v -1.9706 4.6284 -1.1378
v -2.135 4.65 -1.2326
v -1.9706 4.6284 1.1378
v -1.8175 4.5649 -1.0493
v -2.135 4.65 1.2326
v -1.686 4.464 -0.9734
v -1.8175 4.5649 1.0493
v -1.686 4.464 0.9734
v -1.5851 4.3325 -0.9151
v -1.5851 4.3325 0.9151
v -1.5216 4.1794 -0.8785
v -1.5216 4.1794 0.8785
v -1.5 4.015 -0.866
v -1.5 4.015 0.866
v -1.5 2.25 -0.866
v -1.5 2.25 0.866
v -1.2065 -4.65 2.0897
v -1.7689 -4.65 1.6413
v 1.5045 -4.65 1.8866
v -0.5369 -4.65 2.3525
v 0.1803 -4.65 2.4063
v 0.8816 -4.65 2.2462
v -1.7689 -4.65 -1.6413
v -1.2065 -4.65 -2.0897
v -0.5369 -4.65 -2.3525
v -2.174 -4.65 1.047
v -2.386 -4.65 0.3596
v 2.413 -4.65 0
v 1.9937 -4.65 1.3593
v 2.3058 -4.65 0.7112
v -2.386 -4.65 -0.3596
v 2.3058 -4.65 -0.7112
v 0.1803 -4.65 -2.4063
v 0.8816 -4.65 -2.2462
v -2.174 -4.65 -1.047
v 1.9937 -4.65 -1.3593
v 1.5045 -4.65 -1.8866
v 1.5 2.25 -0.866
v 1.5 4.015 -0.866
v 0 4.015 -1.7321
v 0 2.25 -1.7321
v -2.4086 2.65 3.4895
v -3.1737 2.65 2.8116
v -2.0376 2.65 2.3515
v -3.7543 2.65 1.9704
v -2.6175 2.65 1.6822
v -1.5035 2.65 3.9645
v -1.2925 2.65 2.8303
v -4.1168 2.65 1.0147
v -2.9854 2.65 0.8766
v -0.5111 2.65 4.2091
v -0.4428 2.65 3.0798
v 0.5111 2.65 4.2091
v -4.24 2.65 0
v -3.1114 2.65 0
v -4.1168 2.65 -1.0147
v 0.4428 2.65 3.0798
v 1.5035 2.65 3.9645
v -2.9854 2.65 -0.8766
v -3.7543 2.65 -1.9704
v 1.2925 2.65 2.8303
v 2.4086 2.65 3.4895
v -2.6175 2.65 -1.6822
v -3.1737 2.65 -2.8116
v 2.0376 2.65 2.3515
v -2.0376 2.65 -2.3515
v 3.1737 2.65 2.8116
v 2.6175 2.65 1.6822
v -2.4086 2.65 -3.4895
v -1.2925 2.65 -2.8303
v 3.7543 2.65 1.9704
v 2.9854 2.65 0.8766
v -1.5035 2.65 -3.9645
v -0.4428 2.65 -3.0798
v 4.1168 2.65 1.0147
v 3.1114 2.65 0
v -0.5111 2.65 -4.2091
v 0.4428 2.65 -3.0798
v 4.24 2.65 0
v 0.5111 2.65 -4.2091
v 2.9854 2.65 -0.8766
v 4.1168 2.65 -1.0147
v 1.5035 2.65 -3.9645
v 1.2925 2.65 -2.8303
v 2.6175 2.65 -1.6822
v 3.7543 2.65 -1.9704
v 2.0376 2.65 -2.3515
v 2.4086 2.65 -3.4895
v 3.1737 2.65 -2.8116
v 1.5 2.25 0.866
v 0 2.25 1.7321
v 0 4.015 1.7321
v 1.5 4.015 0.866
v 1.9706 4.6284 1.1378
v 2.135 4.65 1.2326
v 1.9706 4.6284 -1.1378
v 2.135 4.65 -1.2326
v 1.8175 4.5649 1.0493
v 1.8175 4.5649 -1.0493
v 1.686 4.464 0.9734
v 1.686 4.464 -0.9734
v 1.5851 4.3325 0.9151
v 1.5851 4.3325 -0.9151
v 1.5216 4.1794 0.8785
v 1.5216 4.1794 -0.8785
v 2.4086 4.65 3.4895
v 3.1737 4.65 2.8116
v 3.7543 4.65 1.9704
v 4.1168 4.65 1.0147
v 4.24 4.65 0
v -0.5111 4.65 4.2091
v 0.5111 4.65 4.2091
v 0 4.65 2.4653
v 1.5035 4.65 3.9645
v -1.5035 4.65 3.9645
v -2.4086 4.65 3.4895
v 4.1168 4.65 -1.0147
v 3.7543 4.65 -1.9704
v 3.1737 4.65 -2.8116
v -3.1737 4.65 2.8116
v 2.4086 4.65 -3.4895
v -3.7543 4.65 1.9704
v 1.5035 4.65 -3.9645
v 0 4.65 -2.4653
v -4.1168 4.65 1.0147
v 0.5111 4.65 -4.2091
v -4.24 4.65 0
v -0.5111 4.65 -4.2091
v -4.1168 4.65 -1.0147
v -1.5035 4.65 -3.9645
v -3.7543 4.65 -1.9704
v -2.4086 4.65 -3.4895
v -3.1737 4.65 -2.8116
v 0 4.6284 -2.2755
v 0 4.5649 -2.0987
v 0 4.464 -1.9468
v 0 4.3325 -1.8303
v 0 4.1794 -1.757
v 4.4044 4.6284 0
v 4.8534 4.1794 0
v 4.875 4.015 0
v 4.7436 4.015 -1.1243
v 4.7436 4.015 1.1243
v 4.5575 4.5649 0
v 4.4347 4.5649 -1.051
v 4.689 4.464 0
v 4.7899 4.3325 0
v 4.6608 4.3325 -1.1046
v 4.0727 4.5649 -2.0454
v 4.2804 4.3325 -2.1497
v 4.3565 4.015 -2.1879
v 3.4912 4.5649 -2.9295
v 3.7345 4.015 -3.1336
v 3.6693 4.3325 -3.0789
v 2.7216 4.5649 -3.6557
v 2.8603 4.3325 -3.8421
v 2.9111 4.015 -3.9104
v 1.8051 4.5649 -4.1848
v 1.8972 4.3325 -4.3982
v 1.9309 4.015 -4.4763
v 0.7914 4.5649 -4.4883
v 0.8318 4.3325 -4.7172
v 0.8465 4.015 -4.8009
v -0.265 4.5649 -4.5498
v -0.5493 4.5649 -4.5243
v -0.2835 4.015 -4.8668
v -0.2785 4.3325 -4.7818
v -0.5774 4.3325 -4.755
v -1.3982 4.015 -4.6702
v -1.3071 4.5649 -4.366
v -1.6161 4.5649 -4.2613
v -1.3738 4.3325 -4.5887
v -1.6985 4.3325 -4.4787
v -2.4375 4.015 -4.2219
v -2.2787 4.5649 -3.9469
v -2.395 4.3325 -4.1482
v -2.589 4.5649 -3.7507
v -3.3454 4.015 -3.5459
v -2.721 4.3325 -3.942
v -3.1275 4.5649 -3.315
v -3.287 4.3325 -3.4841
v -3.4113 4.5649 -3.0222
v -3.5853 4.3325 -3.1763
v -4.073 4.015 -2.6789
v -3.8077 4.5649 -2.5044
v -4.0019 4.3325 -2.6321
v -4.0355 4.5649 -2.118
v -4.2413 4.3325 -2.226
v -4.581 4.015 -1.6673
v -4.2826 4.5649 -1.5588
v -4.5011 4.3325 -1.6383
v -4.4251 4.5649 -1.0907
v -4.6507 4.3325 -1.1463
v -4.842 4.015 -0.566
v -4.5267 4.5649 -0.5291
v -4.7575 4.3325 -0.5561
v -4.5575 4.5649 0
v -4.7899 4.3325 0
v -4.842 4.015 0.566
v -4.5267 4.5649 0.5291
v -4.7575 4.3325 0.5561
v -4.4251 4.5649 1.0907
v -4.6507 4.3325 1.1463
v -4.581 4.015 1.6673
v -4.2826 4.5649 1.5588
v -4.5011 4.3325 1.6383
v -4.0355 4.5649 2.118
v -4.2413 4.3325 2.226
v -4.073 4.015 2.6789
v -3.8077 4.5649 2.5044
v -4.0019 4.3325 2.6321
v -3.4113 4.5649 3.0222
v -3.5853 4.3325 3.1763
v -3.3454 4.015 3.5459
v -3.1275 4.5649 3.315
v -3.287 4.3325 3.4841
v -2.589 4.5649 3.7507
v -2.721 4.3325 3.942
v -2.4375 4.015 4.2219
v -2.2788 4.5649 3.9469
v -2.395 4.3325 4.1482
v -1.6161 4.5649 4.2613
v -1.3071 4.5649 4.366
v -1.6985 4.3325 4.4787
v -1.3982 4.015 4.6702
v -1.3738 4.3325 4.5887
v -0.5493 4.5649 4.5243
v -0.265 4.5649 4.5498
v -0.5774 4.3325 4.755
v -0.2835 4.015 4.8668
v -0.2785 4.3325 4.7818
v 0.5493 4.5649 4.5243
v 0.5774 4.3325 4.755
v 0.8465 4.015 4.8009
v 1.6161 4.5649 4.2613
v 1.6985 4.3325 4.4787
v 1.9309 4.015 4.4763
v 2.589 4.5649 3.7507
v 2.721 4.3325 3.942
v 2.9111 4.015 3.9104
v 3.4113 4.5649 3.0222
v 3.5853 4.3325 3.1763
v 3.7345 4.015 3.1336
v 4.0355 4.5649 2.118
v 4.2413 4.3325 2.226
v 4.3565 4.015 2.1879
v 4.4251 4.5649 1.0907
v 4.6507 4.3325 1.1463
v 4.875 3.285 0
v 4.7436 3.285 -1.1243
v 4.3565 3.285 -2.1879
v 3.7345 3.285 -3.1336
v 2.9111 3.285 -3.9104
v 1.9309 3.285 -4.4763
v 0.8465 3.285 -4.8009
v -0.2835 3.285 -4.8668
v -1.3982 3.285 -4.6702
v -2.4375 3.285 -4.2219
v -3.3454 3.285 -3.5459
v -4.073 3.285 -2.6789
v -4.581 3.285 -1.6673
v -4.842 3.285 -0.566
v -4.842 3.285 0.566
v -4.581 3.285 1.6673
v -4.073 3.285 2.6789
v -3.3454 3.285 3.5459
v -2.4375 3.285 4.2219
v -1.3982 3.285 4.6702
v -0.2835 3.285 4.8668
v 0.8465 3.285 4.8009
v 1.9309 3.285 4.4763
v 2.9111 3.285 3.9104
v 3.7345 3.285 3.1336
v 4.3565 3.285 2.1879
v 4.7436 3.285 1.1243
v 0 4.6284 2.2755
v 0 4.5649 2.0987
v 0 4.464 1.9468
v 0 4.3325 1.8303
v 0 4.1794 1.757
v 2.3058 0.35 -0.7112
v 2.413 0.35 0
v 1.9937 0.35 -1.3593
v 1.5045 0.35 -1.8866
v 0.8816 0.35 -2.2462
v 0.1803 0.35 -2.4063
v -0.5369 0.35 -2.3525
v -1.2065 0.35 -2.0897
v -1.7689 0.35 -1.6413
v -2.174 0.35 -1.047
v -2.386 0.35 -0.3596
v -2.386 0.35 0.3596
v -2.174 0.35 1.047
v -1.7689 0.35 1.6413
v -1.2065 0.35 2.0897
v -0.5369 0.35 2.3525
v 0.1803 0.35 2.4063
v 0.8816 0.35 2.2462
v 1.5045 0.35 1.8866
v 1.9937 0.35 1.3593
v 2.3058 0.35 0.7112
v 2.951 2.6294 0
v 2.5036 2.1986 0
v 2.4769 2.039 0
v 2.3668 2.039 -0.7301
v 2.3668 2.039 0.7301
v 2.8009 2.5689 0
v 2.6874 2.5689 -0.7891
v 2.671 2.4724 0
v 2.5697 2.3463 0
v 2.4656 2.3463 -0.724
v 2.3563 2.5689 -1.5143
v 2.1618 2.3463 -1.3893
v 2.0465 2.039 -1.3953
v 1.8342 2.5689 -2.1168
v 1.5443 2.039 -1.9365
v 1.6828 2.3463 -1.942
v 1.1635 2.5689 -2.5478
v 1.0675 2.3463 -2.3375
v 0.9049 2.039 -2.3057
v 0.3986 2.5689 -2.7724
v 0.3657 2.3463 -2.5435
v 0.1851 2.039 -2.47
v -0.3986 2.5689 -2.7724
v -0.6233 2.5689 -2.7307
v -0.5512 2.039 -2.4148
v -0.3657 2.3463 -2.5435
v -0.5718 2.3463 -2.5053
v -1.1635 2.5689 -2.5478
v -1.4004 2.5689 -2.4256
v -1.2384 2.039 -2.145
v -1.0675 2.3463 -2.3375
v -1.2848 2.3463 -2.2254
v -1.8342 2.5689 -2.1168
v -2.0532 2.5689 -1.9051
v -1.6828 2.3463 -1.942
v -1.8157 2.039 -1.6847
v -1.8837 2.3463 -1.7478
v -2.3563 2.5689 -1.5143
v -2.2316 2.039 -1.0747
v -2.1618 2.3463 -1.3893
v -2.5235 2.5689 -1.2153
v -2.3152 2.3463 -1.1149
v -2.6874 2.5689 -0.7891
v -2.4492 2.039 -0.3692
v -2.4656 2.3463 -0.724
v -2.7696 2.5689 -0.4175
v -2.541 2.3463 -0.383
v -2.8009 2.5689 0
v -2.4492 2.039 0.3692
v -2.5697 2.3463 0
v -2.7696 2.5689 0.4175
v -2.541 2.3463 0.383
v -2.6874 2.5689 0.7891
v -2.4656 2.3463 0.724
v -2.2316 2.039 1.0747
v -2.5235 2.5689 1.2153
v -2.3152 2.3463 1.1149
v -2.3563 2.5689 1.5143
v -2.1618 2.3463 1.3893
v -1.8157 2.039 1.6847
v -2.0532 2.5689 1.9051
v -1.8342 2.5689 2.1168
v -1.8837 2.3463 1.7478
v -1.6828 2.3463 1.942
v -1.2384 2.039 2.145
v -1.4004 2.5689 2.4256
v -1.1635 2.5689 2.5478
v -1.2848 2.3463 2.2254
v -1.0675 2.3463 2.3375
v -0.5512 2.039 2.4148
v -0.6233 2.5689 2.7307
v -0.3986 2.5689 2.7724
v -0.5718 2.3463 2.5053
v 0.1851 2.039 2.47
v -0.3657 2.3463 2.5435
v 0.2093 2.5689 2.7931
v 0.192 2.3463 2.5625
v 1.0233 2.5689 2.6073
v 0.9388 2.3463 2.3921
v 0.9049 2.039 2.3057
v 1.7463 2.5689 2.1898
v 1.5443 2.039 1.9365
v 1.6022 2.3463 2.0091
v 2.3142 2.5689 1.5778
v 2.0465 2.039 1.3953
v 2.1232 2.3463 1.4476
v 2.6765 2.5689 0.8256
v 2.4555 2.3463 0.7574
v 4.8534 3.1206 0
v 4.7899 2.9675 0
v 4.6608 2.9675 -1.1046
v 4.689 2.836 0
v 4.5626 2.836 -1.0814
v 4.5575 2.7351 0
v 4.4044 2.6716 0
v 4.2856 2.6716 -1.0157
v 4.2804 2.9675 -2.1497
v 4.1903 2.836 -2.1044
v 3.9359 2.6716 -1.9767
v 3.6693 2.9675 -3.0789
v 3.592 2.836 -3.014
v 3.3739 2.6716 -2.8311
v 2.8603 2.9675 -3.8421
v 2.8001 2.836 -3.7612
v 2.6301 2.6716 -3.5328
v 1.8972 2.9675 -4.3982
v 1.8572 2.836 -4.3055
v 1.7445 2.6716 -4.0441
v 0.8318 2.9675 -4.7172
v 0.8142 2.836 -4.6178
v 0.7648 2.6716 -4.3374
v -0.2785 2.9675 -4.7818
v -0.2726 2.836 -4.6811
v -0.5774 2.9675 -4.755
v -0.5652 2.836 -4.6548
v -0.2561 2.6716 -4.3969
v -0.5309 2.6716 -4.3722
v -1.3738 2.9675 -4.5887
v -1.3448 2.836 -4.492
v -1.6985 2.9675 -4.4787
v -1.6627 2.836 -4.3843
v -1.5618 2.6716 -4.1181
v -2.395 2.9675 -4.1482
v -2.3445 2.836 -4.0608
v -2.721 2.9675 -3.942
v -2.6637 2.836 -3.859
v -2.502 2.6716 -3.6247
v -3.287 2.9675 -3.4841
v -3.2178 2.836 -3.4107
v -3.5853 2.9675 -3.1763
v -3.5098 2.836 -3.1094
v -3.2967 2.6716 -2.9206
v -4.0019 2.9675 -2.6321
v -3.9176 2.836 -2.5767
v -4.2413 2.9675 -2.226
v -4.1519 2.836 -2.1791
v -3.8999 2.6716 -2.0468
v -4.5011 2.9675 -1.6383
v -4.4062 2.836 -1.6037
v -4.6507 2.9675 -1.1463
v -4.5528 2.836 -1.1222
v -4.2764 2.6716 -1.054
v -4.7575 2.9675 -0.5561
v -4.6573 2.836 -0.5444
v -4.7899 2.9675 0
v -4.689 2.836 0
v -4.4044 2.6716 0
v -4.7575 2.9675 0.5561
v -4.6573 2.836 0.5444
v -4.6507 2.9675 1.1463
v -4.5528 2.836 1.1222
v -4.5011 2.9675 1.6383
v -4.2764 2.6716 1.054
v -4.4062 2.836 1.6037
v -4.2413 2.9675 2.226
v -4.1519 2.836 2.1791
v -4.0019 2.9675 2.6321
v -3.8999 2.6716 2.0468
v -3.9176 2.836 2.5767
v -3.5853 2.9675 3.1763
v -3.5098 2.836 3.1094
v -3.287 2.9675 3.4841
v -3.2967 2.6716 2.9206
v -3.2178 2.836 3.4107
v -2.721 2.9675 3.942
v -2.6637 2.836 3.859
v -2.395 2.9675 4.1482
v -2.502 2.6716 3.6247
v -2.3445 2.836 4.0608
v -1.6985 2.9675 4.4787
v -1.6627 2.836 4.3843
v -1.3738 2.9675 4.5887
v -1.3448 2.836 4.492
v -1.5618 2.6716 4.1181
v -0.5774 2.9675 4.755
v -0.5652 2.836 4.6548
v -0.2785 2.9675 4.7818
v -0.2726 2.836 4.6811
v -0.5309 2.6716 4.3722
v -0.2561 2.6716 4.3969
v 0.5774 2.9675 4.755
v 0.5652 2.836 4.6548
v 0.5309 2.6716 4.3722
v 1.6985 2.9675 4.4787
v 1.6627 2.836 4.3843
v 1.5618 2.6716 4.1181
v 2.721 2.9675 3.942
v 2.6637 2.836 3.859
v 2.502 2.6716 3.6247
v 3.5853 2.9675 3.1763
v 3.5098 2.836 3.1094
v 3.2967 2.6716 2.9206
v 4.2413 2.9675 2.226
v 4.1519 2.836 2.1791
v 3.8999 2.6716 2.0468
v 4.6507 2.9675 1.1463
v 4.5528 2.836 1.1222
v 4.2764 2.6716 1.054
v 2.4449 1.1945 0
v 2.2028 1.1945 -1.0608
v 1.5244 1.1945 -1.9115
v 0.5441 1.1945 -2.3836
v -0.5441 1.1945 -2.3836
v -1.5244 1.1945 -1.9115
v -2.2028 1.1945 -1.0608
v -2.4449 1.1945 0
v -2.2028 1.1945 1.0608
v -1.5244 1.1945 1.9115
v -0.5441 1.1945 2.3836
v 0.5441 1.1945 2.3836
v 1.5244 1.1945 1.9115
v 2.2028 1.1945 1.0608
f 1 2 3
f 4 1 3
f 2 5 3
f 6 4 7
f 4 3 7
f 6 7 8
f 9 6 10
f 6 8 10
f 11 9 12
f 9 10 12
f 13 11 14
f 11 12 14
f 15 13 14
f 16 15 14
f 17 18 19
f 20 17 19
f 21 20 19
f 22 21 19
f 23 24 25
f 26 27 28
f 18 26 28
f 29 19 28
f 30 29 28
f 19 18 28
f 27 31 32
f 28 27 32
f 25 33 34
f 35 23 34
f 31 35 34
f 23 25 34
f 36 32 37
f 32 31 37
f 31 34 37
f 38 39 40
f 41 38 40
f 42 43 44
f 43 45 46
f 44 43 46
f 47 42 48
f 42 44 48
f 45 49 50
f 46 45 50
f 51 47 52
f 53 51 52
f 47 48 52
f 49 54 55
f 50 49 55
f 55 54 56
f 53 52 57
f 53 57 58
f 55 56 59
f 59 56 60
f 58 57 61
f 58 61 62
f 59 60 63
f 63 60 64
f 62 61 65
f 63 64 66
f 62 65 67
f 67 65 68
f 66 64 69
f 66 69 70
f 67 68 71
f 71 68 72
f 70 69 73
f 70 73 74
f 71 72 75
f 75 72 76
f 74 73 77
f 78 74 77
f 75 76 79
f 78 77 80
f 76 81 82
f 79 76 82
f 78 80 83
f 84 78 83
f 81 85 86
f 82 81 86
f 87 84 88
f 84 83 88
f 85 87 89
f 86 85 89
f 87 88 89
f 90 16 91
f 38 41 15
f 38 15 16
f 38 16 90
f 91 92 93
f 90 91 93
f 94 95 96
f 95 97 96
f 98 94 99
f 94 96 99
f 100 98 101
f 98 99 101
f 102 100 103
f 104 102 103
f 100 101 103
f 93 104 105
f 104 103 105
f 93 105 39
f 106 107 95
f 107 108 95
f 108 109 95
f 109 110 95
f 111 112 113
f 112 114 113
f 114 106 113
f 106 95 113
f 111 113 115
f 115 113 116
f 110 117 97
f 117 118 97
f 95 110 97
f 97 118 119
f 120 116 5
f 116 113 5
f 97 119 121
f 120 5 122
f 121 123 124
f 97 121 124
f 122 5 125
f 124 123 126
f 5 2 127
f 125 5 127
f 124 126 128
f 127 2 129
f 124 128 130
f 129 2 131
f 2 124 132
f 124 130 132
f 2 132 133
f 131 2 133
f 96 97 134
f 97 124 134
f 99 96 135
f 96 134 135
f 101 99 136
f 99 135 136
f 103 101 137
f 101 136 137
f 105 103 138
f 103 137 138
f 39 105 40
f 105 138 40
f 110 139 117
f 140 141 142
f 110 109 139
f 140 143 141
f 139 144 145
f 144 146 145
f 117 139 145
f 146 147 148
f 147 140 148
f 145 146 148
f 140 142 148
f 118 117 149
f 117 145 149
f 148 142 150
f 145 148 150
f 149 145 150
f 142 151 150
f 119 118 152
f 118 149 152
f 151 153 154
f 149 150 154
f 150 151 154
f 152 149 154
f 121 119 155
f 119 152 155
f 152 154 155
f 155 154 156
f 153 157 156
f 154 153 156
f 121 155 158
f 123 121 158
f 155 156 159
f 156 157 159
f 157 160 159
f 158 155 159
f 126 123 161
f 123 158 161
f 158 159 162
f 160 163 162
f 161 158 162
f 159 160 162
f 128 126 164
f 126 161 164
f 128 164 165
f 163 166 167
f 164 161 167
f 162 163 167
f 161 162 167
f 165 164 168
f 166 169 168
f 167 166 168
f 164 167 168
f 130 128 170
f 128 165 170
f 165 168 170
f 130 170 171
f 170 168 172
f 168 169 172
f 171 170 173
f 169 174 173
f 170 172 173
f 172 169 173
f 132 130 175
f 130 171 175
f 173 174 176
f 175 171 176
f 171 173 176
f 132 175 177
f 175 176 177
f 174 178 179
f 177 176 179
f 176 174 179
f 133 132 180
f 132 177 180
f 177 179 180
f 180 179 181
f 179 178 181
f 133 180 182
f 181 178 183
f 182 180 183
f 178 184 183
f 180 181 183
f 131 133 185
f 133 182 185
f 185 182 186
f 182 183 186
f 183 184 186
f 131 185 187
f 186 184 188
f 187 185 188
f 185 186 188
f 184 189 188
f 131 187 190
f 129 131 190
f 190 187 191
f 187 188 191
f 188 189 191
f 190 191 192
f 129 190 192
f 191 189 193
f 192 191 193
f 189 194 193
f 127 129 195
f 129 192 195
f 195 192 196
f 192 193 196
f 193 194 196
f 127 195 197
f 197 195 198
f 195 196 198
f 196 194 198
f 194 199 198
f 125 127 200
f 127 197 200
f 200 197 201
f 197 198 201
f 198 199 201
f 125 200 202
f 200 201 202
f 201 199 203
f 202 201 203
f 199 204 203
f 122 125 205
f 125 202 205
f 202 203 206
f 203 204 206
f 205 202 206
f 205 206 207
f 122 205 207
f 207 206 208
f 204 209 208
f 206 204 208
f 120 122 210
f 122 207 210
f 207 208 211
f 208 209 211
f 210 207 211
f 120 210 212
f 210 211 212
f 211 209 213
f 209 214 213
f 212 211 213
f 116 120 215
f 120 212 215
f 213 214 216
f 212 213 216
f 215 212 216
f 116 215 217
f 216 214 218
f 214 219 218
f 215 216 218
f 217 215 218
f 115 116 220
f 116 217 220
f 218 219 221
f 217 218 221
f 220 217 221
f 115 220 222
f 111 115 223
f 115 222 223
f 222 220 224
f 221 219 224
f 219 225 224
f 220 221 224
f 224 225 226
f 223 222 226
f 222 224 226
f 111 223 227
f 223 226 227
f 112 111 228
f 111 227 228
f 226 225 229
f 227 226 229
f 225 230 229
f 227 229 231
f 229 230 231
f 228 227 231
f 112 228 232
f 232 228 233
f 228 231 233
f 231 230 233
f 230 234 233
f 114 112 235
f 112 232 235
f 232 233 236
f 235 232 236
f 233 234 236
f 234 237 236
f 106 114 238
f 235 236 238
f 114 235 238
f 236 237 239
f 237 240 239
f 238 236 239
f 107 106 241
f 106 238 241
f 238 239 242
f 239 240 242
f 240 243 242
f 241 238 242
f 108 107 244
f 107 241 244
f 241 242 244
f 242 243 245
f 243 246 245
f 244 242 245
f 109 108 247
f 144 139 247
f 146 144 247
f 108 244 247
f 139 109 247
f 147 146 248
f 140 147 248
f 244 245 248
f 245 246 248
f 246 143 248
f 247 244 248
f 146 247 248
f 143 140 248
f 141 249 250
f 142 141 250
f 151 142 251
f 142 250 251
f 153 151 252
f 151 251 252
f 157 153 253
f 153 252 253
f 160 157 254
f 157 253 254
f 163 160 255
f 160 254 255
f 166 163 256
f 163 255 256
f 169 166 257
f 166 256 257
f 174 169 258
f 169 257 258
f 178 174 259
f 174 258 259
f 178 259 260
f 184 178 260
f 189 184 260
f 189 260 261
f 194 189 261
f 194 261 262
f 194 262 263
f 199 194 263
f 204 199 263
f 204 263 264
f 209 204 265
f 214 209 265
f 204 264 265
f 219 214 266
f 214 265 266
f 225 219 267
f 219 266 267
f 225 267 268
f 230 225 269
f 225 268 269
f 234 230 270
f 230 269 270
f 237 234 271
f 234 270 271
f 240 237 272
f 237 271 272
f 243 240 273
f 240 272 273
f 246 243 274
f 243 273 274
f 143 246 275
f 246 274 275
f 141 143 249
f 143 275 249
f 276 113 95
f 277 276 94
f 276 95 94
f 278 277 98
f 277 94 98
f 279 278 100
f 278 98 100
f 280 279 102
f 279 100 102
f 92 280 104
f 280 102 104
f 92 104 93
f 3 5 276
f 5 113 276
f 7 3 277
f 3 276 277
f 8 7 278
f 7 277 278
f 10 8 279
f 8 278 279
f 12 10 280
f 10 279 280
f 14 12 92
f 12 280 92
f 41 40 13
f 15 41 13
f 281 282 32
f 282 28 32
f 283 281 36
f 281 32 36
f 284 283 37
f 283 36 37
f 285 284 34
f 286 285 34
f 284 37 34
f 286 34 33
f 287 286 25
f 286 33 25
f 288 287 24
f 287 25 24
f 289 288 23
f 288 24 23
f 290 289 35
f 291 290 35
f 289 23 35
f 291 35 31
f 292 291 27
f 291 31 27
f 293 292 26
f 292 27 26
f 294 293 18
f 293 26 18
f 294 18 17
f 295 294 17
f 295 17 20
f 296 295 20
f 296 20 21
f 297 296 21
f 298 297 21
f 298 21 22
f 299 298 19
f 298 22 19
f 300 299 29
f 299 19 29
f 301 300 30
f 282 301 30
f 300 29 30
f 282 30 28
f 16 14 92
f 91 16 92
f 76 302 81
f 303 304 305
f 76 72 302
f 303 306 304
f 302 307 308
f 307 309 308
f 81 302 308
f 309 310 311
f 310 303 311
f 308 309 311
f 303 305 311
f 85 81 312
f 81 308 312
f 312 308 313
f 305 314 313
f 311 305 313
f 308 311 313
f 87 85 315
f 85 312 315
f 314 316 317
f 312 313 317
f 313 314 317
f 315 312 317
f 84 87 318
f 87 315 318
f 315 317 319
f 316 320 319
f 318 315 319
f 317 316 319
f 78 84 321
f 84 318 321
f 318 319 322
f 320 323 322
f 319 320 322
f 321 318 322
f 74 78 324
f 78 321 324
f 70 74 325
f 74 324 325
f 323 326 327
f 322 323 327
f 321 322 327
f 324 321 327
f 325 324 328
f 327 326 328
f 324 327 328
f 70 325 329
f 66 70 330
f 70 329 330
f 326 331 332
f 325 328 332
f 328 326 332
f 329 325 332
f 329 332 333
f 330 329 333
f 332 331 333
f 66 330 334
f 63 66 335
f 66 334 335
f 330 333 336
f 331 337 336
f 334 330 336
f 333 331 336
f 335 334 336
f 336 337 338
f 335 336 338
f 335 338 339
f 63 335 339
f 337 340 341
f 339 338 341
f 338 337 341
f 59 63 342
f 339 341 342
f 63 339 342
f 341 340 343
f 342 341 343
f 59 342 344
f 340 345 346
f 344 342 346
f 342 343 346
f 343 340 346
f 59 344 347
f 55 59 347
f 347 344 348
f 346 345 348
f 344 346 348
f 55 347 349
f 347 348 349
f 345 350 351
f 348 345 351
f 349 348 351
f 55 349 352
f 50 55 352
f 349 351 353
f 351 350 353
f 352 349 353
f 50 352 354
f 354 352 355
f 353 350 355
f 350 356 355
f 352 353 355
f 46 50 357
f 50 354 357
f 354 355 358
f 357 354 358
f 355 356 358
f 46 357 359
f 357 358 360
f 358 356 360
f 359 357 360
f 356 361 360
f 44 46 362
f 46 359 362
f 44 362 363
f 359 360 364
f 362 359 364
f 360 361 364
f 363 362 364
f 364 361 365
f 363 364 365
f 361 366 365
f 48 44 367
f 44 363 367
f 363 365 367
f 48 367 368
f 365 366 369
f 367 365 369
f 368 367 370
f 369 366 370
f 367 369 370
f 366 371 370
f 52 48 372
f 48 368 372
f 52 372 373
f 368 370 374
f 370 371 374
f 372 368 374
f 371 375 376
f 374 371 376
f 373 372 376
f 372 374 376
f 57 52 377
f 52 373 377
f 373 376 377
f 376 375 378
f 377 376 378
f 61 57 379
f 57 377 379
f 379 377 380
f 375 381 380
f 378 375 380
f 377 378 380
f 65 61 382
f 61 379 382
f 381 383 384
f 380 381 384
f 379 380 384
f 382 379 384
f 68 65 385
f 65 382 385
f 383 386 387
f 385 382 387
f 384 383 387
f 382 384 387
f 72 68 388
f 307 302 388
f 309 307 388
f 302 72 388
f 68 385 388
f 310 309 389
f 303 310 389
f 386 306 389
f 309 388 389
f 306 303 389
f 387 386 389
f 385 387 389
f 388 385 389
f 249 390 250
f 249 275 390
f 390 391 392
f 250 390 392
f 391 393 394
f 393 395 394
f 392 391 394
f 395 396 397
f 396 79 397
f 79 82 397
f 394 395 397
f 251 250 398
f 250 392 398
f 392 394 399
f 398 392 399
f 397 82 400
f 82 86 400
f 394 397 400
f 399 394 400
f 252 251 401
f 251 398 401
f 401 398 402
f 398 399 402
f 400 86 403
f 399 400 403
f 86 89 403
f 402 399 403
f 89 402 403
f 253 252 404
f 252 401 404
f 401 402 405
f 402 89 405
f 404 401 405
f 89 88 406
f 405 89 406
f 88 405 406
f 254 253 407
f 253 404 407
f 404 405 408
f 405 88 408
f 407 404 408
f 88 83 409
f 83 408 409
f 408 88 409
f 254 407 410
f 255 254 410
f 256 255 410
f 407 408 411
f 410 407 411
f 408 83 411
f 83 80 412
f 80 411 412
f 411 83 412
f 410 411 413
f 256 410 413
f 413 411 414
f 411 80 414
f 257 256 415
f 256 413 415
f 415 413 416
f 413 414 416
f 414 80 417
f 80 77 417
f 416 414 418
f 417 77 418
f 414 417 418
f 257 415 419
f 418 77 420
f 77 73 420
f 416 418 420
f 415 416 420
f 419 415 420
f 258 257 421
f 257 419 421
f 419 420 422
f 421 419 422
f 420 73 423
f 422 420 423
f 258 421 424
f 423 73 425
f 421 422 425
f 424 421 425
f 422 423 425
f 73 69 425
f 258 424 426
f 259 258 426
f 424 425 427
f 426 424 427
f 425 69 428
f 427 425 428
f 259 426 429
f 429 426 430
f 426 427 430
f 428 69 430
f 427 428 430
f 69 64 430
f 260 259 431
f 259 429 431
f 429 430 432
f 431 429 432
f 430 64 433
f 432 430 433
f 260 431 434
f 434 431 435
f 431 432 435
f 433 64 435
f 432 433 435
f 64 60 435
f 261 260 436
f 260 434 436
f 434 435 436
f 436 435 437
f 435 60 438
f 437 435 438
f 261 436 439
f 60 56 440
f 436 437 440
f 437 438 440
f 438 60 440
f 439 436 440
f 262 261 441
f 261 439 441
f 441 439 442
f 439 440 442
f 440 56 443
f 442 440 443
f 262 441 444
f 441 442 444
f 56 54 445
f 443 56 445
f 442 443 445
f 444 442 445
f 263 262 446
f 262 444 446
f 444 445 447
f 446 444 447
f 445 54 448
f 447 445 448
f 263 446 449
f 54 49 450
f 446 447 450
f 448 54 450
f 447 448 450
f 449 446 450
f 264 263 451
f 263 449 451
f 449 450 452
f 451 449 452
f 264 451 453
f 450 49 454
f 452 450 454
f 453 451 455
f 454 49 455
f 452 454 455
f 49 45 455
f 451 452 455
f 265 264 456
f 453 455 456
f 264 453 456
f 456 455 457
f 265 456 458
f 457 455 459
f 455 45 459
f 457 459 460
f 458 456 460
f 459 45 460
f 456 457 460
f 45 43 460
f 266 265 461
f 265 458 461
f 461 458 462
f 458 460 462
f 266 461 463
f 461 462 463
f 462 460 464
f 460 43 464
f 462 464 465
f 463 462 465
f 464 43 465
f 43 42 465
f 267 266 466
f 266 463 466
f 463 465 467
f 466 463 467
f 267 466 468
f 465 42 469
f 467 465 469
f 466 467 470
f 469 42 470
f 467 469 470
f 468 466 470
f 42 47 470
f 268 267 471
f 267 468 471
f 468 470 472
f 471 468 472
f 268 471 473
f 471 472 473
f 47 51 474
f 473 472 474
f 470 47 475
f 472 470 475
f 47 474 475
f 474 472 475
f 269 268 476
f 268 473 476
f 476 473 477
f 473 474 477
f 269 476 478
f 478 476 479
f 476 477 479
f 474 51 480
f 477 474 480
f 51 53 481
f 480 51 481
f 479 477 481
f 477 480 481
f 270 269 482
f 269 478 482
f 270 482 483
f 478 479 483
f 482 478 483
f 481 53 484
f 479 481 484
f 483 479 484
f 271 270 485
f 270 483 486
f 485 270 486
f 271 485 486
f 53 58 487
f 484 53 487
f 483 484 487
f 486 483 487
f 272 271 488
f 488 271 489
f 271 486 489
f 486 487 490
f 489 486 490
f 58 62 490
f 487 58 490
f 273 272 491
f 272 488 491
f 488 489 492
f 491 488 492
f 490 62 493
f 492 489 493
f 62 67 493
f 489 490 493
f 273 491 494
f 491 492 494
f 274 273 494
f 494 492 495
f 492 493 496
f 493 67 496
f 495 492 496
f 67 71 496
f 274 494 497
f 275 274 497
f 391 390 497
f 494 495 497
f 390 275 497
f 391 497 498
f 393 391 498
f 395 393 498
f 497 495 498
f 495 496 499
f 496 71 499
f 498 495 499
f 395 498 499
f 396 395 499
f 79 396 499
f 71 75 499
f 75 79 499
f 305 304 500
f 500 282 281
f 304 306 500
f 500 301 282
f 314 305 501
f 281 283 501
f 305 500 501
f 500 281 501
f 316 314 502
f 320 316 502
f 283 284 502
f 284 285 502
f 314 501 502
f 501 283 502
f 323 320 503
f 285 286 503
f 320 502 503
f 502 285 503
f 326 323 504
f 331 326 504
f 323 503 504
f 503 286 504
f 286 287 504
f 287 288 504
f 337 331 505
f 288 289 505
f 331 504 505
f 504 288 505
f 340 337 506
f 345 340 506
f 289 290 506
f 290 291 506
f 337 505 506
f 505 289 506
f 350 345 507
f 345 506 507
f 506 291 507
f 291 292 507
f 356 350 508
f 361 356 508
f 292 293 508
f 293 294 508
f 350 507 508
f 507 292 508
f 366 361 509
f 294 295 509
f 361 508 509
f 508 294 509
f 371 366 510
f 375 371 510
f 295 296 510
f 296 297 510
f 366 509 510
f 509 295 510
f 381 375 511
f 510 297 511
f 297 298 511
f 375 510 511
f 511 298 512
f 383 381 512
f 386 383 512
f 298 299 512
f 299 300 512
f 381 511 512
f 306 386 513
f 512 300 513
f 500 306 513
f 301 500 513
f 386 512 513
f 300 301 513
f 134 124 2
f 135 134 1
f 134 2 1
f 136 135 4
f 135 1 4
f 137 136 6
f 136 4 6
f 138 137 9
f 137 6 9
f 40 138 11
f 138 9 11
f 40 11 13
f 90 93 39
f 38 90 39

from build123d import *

# Parameters (mm, degrees)
FILLET1_R          = 0.635
CUT_EXTRUDE1_DEPTH = 2.4
FILLET2_R          = 0.635


with BuildPart() as part:
    # Sketch2 → Revolve1 (revolve)
    with BuildSketch(Plane.XY):
        Polygon((0, 4.65), (4.875, 4.65), (4.875, 2.65), (2.5, 2.65), (2.413, 0.35), (2.413, -4.65), (0, -4.65), align=None)
    revolve(axis=Axis((0, -4.65, 0), (0, 1, 0)))

    # Fillet1
    fillet1_edges = [part.edges().sort_by_distance(p)[0] for p in [
        (-2.5, 2.65, 0),
        (-4.875, 2.65, 0),
        (-4.875, 4.65, 0),
    ]]
    fillet(fillet1_edges, radius=FILLET1_R)

    # Sketch3 → Cut-Extrude1 (cut)
    with BuildSketch(Plane(origin=(0, 4.65, 0), x_dir=(1, 0, 0), z_dir=(0, 1, 0))):
        Polygon((0, 1.732050808), (-1.5, 0.866025404), (-1.5, -0.866025404), (0, -1.732050808), (1.5, -0.866025404), (1.5, 0.866025404), align=None)
    extrude(amount=-CUT_EXTRUDE1_DEPTH, mode=Mode.SUBTRACT)

    # Fillet2
    fillet2_edges = [part.edges().sort_by_distance(p)[0] for p in [
        (0.75, 4.65, -1.299038106),
        (-0.75, 4.65, -1.299038106),
        (-1.5, 4.65, 0),
        (-0.75, 4.65, 1.299038106),
        (0.75, 4.65, 1.299038106),
        (1.5, 4.65, 0),
    ]]
    fillet(fillet2_edges, radius=FILLET2_R)


solid = part.part
